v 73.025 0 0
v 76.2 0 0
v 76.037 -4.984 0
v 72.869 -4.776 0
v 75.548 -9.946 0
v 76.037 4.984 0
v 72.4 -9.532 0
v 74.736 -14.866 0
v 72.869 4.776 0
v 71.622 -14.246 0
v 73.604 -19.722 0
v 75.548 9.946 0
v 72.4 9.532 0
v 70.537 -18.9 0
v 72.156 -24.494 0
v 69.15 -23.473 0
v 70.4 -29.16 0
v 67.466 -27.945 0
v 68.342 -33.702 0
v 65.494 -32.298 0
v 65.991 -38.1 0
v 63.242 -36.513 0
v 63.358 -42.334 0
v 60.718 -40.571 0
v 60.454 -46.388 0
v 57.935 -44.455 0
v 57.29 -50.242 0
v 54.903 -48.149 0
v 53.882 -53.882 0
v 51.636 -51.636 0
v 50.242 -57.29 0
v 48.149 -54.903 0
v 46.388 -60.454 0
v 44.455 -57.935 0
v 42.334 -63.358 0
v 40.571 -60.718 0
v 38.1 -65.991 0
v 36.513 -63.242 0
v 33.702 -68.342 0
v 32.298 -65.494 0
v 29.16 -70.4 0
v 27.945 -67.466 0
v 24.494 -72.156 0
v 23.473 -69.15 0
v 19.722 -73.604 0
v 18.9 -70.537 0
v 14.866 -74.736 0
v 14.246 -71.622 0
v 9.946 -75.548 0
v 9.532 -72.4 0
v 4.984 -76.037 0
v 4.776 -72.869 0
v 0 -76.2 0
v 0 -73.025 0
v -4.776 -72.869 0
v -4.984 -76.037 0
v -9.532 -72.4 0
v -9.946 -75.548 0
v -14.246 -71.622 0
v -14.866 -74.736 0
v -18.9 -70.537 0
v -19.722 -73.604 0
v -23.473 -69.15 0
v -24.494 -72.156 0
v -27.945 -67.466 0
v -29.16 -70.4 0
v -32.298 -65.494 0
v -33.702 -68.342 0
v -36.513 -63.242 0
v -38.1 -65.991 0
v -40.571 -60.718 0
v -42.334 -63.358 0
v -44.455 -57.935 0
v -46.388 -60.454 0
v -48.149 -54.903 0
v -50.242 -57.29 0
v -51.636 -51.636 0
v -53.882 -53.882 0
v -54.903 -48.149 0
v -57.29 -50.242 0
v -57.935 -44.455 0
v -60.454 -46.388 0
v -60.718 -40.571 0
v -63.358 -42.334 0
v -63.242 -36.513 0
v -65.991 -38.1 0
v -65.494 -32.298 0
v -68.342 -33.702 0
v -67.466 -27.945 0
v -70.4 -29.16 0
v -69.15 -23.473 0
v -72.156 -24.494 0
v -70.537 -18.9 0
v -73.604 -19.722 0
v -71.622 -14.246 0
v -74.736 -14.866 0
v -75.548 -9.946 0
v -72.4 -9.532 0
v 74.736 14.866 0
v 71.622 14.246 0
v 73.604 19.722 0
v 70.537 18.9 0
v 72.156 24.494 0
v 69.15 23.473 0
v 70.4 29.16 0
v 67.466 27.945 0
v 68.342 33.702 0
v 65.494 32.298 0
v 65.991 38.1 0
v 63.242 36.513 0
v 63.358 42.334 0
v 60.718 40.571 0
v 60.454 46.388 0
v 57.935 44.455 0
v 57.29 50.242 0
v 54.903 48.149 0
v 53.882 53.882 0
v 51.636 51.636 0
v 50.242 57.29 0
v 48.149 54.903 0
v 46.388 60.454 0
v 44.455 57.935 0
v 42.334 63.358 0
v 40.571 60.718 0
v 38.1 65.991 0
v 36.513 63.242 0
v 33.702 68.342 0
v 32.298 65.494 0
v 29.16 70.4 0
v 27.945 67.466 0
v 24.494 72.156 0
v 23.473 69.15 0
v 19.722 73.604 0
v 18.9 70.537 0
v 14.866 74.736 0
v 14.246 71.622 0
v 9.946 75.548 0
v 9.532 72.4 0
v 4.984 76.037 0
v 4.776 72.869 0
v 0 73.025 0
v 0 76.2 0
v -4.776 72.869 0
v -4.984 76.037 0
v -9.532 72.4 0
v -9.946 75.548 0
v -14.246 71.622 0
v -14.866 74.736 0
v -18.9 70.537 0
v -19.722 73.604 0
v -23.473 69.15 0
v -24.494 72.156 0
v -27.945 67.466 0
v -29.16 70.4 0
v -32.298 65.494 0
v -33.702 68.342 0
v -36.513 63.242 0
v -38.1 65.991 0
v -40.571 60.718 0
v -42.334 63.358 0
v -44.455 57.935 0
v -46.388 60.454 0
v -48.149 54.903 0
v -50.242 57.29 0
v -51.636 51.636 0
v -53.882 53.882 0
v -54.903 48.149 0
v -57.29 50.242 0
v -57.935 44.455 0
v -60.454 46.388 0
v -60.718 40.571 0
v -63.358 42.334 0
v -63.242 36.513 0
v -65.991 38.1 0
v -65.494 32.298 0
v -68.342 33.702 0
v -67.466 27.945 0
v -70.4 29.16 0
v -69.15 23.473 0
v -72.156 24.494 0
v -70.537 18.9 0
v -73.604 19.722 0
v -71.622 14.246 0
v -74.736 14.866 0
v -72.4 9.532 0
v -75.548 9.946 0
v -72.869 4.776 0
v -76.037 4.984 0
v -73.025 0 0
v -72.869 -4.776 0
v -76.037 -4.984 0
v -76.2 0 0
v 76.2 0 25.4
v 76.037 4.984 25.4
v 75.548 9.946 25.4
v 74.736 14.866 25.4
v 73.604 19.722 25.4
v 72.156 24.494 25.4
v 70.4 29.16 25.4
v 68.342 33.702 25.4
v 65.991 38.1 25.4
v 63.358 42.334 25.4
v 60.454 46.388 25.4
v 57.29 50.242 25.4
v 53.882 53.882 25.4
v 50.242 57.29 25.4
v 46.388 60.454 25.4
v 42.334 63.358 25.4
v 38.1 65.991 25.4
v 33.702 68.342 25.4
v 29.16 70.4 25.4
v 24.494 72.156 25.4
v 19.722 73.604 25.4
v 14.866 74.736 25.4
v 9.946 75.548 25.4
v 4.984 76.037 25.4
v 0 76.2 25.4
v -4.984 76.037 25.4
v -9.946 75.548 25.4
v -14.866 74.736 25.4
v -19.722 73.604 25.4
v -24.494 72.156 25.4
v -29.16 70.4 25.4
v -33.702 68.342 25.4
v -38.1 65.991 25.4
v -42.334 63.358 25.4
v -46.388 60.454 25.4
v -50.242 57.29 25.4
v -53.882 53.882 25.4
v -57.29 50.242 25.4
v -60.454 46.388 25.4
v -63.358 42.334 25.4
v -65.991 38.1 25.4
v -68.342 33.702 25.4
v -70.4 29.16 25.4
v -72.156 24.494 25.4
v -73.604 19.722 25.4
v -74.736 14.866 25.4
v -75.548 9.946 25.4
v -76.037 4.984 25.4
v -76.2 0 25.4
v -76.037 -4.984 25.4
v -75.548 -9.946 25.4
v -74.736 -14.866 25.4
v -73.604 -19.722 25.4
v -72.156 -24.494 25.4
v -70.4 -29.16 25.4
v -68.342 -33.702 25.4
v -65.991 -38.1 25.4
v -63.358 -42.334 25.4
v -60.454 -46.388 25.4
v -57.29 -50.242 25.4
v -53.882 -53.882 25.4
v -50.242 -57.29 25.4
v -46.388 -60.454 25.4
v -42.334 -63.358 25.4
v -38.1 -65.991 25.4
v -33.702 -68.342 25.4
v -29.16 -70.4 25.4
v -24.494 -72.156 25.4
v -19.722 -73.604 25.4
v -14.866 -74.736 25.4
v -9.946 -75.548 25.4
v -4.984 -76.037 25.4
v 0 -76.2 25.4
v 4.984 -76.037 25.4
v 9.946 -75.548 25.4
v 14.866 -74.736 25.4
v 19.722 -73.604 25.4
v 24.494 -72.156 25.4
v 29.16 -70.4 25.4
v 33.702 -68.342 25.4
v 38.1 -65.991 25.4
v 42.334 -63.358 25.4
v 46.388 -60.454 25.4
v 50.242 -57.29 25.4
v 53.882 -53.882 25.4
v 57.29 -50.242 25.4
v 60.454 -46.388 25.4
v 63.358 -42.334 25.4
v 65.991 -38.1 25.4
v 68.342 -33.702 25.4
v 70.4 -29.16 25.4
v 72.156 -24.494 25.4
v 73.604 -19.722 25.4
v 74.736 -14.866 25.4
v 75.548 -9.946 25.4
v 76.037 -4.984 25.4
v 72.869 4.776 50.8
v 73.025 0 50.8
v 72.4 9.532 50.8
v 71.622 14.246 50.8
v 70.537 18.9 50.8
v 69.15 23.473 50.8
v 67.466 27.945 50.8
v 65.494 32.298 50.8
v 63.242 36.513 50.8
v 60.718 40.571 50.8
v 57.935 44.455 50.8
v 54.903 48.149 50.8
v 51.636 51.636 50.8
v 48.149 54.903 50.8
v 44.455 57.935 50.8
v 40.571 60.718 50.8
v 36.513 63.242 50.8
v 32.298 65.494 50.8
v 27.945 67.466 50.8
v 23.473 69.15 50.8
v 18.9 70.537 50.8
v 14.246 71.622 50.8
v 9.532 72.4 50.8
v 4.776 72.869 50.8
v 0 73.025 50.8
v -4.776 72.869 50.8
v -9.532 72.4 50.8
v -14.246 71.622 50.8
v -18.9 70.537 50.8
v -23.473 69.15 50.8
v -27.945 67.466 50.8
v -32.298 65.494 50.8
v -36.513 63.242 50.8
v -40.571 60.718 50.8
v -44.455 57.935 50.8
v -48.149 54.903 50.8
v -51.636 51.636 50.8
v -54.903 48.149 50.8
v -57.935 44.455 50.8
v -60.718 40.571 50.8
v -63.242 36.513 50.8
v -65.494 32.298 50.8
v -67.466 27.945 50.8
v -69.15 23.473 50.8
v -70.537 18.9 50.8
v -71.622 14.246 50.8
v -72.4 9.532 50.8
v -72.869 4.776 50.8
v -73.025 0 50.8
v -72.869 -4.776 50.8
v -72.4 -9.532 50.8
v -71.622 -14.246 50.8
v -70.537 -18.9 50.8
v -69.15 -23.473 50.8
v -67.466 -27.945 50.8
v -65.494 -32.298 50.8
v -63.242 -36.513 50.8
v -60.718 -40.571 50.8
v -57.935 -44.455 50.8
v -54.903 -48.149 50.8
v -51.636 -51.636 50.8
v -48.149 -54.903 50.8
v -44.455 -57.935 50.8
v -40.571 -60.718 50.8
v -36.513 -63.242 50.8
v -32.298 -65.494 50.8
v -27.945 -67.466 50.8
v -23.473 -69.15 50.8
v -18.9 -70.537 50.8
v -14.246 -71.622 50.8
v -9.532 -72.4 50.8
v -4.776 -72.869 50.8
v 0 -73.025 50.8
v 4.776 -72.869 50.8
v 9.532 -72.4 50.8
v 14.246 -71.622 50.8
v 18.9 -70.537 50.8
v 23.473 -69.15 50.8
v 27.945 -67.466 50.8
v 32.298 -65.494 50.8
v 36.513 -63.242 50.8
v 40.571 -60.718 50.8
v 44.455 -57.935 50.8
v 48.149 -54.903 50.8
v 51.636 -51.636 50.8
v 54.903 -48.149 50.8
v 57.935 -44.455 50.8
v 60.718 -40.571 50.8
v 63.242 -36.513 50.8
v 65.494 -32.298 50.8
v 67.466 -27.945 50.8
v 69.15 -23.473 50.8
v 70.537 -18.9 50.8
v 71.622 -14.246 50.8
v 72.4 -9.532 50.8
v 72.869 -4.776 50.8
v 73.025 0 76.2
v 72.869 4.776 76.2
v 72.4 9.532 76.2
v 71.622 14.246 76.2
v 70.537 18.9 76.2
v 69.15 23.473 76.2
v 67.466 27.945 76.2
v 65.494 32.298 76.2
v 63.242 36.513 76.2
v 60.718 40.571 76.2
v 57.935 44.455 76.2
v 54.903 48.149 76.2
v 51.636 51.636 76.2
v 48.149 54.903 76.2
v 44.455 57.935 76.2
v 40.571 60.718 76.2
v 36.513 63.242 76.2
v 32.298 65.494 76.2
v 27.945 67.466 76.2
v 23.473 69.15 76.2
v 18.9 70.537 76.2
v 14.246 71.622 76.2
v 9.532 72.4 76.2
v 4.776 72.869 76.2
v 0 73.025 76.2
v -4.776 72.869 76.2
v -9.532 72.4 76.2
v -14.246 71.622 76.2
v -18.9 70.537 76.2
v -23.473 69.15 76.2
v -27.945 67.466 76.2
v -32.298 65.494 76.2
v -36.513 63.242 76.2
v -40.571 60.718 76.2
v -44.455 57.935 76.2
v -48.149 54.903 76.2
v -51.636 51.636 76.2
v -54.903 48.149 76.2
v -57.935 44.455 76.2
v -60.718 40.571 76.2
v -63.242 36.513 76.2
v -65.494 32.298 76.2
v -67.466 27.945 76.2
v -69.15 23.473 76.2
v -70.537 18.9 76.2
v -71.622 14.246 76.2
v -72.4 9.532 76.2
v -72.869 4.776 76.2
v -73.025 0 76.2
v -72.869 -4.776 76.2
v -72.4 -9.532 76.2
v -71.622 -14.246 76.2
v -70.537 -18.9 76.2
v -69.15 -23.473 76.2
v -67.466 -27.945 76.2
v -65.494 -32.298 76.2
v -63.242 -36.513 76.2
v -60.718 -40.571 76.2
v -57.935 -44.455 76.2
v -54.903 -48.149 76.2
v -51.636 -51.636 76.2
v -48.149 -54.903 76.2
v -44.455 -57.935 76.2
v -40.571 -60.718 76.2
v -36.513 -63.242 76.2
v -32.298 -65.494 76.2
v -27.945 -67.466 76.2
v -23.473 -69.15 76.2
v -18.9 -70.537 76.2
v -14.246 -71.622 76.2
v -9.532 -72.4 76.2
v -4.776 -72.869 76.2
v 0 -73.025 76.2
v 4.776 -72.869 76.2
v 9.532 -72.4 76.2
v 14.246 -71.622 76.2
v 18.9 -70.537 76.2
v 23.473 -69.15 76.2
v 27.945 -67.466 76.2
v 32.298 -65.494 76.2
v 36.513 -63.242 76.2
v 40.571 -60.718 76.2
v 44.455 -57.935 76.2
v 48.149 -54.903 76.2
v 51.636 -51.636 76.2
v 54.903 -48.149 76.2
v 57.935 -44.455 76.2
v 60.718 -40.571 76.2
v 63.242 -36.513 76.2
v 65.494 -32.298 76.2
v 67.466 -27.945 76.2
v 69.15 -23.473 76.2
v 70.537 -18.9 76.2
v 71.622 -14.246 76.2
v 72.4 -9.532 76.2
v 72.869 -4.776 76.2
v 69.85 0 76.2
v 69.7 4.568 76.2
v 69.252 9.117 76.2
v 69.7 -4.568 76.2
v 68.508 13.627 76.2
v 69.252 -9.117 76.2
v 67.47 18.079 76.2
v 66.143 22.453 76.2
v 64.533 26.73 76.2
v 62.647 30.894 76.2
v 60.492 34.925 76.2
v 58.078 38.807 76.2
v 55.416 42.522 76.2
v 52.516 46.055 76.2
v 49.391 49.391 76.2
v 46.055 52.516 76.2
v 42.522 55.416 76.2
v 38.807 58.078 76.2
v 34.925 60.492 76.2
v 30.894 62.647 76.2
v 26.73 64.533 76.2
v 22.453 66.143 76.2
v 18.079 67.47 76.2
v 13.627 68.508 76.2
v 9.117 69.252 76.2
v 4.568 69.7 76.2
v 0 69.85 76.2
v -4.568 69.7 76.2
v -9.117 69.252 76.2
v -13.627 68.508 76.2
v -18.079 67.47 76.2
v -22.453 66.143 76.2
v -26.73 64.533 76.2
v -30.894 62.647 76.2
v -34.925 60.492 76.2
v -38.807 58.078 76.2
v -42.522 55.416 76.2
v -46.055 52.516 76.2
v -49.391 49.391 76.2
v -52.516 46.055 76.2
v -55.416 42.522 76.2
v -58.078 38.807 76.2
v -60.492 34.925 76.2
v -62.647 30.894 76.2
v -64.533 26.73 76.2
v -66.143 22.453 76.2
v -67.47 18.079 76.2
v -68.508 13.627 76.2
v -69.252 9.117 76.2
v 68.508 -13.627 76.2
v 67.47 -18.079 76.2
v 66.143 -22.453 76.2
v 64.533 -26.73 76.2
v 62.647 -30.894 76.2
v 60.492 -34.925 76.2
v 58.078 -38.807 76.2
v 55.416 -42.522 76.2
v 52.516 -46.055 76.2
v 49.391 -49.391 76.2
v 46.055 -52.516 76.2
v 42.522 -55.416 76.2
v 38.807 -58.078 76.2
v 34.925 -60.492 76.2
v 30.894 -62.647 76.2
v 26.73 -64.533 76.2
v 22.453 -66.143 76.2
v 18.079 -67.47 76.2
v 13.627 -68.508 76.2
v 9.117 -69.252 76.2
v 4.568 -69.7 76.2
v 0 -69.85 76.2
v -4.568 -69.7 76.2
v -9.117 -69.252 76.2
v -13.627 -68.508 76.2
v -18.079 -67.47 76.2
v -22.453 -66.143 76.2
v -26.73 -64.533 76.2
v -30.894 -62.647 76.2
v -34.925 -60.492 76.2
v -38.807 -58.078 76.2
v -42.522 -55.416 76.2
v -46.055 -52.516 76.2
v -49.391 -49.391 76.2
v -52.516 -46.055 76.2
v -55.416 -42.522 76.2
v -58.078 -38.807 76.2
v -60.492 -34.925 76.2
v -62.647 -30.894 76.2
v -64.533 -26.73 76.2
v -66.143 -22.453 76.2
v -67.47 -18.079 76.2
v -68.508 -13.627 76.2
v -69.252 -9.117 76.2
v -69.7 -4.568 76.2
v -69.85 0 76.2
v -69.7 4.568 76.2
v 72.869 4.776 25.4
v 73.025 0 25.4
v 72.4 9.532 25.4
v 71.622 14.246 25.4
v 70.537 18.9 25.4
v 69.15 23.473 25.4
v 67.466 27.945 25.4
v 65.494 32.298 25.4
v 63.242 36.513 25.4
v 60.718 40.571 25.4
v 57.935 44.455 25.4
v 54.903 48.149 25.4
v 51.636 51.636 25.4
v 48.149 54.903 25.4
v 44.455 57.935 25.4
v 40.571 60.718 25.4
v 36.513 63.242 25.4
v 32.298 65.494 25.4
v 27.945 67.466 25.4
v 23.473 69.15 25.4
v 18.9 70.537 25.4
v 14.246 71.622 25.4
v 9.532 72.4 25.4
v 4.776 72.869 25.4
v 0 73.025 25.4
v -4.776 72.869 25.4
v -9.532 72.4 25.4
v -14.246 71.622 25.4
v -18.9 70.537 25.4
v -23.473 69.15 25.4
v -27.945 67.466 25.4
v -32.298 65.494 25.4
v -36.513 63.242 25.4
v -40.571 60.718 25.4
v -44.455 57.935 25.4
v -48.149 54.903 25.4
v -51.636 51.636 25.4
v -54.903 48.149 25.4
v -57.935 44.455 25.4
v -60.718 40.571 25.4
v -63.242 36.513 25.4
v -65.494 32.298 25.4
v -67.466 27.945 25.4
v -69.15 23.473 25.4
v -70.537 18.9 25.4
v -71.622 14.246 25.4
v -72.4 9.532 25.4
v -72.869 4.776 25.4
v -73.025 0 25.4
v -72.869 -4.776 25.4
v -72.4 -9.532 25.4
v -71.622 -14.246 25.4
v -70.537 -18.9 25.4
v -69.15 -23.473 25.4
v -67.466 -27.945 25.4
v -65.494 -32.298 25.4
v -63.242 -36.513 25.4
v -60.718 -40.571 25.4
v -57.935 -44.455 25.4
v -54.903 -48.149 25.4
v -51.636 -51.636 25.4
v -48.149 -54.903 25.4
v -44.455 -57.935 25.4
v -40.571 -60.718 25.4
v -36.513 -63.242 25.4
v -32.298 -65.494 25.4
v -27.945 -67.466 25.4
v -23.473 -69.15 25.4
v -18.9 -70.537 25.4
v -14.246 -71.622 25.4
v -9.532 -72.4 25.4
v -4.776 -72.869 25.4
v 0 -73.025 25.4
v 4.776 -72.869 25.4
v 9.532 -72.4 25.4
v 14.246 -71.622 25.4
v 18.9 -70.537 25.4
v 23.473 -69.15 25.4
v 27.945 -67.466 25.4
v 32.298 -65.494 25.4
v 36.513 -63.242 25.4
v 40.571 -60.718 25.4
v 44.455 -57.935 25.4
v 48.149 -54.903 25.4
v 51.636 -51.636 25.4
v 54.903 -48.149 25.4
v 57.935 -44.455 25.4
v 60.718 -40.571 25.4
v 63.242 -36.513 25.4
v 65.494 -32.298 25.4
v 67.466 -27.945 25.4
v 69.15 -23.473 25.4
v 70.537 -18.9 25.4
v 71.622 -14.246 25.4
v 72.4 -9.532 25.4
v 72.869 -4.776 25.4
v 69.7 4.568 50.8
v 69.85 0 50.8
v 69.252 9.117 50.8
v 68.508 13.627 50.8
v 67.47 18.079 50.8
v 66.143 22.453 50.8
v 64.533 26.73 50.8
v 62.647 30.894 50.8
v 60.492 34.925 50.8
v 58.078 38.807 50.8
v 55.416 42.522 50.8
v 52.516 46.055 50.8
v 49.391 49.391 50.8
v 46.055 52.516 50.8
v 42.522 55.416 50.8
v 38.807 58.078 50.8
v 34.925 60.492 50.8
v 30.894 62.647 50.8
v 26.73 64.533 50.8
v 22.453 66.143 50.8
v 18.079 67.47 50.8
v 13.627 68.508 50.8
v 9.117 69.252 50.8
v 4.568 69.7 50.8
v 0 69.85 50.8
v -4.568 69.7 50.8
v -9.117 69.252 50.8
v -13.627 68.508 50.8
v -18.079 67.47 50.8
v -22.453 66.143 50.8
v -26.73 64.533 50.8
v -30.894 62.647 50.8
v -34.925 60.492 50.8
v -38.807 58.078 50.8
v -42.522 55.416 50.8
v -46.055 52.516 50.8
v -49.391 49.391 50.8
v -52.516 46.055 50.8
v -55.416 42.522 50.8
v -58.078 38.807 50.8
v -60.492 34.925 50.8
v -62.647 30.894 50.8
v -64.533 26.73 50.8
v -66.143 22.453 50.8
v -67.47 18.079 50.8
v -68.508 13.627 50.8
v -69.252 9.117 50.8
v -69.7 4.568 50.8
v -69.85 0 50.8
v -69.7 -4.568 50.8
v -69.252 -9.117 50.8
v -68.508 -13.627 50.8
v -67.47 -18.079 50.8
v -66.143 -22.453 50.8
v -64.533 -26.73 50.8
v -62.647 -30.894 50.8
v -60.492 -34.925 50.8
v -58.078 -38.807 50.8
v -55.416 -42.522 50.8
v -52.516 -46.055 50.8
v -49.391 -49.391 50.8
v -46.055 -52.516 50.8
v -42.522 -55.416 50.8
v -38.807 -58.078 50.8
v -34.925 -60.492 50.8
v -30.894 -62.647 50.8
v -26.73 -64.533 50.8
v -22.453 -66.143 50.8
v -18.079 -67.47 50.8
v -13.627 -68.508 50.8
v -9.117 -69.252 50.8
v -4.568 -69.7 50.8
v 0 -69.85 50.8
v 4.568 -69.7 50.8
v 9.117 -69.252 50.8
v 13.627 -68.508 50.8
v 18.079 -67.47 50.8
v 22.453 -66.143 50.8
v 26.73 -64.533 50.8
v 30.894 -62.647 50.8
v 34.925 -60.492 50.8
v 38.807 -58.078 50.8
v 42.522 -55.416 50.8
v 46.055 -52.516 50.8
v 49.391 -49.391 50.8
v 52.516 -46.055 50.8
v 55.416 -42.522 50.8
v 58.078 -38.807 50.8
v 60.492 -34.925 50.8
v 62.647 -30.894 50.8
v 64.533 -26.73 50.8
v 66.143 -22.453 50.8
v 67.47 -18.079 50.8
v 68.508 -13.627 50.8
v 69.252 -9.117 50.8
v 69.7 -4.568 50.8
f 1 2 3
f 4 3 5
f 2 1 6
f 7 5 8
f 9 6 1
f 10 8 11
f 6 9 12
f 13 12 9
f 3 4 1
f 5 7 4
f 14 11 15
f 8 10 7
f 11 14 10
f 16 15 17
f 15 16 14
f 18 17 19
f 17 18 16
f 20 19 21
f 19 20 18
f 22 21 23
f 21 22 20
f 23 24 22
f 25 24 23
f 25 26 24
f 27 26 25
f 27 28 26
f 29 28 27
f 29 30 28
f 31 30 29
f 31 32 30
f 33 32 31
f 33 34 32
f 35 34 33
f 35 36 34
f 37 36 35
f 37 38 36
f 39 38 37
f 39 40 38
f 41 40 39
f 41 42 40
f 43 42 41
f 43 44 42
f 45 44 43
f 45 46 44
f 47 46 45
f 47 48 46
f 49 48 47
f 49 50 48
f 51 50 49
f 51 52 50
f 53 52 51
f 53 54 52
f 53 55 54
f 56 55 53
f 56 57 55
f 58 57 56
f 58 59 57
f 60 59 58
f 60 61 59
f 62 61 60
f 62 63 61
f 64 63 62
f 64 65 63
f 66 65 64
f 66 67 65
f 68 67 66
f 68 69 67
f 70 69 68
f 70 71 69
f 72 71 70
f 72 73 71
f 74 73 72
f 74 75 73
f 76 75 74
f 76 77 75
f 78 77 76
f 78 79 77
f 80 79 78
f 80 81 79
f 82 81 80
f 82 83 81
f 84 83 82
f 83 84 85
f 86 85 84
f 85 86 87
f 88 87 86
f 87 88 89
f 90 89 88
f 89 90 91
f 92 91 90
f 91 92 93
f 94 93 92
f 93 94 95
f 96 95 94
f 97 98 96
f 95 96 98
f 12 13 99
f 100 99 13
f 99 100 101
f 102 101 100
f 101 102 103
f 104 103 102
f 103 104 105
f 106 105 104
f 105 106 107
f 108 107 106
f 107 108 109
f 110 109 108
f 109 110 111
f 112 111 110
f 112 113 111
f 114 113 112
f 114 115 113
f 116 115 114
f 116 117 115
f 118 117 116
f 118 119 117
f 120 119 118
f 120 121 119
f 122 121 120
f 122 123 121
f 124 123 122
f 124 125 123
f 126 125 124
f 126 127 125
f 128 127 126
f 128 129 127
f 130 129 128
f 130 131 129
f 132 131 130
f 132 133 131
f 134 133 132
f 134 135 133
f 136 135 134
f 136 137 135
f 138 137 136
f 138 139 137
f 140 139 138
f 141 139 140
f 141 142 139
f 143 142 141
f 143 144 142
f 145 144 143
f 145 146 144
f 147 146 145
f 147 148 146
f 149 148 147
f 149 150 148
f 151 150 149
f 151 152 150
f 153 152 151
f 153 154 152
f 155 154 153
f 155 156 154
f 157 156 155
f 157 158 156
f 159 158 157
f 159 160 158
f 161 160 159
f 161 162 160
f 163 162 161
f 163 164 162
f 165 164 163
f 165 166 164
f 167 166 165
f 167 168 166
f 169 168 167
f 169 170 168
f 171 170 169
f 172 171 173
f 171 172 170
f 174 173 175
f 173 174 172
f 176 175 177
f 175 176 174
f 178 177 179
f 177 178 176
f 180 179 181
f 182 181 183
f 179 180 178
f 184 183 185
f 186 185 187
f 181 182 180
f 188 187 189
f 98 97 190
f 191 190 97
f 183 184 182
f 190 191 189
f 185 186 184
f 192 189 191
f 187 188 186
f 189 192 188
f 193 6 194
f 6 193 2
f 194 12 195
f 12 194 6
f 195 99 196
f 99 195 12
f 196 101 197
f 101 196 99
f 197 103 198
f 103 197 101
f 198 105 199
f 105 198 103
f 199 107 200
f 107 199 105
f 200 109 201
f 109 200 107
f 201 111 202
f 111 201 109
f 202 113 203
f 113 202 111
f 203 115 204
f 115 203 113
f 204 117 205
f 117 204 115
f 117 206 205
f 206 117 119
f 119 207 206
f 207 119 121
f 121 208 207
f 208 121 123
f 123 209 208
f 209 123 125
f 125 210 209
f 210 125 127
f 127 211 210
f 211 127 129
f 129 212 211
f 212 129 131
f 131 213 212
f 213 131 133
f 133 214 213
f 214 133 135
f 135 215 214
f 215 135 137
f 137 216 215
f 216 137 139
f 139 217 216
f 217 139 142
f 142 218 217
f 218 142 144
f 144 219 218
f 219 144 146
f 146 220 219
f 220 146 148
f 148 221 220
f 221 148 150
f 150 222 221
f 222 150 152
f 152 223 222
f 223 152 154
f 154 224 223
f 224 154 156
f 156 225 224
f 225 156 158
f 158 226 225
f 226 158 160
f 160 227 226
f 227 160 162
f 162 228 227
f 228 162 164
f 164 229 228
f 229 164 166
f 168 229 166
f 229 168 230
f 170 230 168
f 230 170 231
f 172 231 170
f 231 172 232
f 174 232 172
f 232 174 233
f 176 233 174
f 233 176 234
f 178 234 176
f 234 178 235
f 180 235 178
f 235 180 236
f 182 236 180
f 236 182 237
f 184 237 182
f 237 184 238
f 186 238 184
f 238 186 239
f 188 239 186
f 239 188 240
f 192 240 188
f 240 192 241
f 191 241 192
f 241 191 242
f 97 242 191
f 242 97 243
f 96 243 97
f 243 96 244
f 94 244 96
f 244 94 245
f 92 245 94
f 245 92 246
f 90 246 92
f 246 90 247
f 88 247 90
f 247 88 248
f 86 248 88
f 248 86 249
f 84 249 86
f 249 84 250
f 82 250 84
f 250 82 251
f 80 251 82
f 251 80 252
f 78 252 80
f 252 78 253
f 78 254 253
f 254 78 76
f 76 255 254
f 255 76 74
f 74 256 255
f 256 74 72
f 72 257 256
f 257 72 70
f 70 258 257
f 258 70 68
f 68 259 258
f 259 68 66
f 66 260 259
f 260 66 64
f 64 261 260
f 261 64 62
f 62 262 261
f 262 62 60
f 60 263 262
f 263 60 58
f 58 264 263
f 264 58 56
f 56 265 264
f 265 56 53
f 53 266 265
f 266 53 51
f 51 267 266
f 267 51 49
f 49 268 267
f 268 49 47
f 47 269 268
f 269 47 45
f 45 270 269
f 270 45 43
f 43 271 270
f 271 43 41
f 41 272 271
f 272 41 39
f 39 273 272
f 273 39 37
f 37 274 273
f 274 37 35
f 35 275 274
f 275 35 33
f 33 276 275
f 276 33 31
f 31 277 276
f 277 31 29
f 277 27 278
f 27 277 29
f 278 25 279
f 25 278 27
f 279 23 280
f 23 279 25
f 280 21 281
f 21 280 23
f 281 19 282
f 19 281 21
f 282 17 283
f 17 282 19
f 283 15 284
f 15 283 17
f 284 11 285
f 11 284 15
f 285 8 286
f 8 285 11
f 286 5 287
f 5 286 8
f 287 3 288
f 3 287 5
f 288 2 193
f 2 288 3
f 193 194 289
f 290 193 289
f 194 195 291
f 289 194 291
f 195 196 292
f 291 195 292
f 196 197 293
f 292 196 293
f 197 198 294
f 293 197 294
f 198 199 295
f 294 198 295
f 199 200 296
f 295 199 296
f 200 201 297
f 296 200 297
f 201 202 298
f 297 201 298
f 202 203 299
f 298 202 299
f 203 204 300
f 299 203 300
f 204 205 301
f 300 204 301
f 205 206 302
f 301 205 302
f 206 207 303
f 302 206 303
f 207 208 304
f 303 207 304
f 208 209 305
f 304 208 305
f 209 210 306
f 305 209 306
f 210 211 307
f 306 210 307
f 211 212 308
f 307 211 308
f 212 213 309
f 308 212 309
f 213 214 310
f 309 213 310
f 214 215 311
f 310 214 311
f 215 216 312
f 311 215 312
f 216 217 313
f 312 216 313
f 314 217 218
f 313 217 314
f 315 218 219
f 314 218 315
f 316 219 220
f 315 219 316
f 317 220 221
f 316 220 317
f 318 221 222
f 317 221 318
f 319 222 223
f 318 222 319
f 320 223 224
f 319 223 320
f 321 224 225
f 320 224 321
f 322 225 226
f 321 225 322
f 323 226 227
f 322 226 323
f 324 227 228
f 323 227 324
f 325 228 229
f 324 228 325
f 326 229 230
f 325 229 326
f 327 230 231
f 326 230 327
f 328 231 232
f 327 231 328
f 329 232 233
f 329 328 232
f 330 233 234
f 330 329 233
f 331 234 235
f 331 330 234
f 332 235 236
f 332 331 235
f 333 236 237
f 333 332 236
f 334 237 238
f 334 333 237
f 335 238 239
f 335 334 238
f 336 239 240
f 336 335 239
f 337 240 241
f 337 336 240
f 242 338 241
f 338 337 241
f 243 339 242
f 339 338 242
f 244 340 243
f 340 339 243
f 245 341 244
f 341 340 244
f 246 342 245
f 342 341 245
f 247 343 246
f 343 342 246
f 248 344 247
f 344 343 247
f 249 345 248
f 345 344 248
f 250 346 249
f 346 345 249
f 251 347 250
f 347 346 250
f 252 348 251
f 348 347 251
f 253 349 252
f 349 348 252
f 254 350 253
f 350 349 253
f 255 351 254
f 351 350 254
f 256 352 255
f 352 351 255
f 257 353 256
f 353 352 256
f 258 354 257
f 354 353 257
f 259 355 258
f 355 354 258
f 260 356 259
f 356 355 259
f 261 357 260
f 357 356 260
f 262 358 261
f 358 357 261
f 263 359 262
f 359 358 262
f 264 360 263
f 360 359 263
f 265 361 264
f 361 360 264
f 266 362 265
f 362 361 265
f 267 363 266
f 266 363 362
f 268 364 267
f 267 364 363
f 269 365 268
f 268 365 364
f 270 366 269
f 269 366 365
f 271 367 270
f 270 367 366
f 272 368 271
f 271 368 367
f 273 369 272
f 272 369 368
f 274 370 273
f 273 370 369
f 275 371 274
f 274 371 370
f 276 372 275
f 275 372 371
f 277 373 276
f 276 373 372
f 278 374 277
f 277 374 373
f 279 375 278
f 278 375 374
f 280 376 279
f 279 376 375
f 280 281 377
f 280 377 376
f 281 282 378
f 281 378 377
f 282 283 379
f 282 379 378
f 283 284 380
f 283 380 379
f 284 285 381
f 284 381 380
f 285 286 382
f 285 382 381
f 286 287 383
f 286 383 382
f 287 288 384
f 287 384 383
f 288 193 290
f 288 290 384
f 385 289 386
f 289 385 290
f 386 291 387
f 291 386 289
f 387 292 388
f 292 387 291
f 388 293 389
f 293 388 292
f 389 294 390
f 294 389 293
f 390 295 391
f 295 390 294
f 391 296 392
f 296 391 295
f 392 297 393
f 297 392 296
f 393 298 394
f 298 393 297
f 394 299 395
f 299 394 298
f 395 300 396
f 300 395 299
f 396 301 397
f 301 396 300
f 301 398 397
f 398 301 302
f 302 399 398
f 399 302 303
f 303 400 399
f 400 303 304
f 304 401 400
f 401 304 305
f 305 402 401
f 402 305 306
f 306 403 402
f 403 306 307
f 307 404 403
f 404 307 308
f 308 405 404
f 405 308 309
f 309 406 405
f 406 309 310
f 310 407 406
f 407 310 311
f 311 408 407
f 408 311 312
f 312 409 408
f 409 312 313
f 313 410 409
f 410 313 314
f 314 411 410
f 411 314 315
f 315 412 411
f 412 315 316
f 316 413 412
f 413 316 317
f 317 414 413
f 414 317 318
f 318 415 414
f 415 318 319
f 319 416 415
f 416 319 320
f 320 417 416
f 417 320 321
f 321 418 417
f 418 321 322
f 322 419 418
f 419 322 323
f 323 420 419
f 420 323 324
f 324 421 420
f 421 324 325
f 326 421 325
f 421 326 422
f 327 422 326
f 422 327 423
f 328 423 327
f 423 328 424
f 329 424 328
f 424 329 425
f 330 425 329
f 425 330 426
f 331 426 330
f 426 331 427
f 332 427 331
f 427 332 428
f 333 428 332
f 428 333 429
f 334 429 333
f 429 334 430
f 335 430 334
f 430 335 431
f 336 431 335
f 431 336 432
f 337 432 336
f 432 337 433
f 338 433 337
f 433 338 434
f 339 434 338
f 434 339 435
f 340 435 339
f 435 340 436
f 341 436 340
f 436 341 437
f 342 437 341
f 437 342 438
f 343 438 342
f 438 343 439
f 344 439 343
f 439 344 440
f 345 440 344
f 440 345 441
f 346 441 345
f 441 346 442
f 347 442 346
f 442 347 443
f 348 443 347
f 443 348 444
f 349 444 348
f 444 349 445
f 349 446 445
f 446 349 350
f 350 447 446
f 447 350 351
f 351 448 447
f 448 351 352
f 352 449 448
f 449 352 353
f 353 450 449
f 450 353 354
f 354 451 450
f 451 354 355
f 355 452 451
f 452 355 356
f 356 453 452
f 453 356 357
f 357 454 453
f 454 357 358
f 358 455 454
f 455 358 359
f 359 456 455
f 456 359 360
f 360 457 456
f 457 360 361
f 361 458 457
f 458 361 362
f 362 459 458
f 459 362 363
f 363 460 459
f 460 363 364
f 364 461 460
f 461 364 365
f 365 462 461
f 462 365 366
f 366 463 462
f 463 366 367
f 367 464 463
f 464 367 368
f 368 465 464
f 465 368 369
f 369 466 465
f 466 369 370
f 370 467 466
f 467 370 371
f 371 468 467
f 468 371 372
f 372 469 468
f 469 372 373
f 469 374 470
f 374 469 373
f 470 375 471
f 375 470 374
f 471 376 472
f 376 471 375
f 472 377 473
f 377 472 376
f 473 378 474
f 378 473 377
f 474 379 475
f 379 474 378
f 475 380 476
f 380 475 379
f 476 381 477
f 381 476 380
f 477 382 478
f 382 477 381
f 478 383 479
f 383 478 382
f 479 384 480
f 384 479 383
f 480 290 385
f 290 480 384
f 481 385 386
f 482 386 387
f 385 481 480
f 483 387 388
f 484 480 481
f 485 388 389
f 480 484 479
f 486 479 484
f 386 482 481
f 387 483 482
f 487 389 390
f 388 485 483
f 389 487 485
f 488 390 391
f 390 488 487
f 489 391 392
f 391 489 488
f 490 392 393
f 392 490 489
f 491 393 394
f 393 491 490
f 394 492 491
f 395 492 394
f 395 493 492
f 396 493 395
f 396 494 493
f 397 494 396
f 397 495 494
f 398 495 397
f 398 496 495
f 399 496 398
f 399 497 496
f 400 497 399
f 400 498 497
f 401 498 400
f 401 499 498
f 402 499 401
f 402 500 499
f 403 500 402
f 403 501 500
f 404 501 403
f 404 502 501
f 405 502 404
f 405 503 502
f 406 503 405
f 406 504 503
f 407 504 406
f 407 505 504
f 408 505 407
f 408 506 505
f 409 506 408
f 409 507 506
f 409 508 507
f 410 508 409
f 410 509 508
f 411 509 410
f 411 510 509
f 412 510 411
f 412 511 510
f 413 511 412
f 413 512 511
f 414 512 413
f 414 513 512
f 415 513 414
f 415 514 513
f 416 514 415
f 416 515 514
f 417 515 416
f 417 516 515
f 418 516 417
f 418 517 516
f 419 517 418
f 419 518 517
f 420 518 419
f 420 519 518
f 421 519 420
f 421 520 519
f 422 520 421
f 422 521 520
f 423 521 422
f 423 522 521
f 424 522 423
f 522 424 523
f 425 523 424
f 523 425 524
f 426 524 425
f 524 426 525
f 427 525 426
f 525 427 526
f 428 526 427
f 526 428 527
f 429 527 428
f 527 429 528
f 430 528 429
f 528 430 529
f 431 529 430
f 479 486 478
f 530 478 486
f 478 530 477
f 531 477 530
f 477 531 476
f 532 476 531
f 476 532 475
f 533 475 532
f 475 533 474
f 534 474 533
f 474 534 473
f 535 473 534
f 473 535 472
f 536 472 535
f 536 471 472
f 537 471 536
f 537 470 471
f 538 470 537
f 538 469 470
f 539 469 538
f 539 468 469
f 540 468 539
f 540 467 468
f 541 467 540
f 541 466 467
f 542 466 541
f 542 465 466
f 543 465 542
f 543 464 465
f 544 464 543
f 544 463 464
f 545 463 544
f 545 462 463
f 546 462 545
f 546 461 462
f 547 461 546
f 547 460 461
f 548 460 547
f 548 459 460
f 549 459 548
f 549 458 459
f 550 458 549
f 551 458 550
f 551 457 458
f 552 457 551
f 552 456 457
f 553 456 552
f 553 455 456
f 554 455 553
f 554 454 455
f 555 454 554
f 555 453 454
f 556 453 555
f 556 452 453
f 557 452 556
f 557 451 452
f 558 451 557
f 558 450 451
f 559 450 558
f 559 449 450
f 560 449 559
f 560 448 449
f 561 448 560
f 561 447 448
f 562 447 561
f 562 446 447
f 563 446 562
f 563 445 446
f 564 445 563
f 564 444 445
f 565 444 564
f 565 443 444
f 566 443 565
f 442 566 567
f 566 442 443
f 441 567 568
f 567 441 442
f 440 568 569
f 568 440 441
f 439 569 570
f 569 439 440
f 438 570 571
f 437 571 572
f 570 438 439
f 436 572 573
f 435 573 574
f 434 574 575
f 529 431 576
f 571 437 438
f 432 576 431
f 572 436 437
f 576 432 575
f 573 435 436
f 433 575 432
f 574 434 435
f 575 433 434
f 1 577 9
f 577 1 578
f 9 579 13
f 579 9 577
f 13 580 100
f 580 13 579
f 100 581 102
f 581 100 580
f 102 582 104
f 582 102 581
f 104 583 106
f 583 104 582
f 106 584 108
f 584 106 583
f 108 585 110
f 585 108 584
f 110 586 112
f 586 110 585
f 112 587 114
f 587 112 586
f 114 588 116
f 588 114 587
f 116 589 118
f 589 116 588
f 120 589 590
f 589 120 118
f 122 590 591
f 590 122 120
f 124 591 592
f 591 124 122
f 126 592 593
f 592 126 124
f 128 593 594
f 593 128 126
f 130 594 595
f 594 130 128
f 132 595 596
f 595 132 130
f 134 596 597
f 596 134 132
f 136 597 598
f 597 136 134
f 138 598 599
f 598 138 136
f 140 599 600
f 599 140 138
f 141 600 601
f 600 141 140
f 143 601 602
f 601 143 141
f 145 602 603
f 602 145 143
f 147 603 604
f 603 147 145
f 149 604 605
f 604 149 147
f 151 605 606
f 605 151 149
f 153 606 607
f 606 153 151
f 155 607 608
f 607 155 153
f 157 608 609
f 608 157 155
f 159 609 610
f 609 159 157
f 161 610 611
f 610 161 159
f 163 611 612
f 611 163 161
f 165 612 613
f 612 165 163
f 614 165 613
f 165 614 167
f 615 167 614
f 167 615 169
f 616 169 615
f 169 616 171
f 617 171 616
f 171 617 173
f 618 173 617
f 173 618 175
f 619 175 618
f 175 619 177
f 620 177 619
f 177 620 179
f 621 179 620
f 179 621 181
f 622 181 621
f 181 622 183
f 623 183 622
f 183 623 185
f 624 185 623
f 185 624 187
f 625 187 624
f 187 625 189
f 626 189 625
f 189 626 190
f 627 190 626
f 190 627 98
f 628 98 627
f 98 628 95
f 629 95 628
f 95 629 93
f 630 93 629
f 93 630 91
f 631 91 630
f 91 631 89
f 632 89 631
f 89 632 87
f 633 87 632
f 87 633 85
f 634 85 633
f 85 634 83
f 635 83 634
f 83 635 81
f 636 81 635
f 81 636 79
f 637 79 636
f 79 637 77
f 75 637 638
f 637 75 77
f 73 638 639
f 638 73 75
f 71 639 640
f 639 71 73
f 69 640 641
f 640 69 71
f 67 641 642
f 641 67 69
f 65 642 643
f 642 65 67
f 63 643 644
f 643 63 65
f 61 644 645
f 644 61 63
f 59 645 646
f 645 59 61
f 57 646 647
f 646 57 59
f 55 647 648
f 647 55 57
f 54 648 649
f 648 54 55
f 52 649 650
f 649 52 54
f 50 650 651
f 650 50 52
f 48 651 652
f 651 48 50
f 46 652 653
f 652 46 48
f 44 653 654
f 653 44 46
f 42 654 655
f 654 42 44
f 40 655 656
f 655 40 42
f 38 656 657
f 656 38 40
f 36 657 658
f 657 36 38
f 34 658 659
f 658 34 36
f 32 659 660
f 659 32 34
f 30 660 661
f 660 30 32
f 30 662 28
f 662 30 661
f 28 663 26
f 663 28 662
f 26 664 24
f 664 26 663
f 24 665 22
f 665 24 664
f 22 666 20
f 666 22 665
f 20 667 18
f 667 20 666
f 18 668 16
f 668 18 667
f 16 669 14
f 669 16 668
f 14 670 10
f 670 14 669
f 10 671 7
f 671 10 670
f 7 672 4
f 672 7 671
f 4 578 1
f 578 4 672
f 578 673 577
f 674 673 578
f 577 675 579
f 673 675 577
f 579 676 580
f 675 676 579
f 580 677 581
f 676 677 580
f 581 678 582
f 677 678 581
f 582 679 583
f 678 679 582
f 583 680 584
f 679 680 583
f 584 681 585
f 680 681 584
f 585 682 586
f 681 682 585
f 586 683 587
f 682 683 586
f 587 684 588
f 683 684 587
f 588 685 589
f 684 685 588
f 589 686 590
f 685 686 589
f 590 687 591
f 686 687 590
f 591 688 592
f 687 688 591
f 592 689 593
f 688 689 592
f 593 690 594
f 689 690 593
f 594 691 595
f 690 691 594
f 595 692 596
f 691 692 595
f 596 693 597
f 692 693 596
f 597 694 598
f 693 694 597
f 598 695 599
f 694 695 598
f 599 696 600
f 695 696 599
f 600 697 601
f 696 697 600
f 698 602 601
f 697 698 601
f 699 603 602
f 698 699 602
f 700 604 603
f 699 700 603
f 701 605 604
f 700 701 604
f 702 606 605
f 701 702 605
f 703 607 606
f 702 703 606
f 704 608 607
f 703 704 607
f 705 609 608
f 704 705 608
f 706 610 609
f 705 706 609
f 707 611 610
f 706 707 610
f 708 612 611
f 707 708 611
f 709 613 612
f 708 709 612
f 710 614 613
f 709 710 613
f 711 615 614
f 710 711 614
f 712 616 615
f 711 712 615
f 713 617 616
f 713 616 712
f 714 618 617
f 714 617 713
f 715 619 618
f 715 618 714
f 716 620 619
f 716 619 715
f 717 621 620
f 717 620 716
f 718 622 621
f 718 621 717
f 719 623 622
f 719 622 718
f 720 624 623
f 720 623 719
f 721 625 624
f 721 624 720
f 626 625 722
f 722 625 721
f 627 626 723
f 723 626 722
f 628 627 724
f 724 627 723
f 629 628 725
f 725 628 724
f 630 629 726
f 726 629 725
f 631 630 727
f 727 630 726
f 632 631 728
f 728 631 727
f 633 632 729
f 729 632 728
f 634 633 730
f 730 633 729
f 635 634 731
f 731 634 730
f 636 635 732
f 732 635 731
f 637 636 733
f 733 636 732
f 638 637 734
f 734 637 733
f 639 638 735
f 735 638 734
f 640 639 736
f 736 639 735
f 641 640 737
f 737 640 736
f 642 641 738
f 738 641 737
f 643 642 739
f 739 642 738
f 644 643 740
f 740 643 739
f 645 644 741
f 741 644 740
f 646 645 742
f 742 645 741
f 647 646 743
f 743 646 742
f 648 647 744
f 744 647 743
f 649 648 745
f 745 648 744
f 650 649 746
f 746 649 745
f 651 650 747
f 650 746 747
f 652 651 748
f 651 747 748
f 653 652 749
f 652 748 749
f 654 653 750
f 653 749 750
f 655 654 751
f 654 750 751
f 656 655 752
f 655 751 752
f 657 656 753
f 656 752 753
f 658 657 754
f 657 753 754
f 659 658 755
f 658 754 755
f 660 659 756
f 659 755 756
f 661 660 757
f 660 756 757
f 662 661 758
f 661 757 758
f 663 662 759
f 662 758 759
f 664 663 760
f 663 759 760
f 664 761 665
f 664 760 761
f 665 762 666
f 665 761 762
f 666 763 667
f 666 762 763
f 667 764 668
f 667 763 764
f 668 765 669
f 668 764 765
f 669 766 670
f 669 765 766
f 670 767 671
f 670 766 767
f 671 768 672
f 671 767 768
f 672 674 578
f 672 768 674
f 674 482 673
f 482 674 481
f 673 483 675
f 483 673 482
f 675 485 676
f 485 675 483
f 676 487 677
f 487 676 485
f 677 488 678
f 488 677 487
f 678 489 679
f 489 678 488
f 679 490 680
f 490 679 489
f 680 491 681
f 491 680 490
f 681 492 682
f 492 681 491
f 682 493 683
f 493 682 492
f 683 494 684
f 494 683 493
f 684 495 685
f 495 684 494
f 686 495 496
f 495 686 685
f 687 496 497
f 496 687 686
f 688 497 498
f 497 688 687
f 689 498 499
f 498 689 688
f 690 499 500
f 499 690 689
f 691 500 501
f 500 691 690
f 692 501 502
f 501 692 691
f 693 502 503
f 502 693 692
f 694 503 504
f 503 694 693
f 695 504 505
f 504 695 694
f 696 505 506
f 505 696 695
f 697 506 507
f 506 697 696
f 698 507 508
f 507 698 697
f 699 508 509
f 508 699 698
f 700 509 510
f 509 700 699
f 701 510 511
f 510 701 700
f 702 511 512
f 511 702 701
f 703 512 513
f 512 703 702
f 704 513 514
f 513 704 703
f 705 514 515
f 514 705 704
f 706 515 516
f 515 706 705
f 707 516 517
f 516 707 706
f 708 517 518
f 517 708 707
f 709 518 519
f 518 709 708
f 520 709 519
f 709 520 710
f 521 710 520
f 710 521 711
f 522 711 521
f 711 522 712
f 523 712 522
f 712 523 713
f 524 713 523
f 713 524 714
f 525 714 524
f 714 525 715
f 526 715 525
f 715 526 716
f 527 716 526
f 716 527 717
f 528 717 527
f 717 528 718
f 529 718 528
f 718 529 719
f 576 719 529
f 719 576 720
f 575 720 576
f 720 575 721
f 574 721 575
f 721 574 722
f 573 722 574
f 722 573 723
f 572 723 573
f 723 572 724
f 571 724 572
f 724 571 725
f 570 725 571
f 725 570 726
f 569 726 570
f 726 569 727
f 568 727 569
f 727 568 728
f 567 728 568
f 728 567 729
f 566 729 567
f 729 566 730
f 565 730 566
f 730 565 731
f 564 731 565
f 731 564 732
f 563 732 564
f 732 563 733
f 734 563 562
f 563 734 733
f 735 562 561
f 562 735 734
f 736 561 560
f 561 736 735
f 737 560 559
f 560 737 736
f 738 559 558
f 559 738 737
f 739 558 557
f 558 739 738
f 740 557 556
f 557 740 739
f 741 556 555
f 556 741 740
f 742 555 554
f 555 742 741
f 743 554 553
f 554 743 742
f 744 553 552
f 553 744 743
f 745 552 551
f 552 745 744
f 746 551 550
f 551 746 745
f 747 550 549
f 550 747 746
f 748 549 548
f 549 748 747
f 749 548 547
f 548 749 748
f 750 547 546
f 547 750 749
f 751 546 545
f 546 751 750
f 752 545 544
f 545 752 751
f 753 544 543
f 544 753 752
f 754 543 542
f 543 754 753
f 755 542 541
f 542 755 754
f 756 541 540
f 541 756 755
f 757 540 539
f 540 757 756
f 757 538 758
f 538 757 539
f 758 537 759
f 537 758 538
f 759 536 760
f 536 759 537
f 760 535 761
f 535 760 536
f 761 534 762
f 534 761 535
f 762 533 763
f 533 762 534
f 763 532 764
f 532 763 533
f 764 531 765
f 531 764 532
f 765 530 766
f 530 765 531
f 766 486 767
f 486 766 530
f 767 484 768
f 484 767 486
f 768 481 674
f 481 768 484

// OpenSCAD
// file: ../lib/TOGArrayLib1.scad
// TOGArrayLib1.4
// 
// Functions for working with arrays.
// 
// v1.1:
// - tal1_reduce assert(is_list(items)) to prevent infinite recursion
//   when given undefined or other non-list values
// v1.1.1:
// - Fix tal1_uniq_remap_v2 to return "list-remap-result" as the
//   first element of the returned list
// v1.2:
// - Add tal1_replace_at function
// v1.3:
// - tal1_is_vec_of, tal1_is_vec_of_num
// v1.4:
// - tal1_assert_for_each, for when you want to assert something
//   about each of a list of items and get nice failure messages

/**
 * Make a list with the contents of list `a`,
 * but starting at offset `off`, replaced by the contents of list `b`.
 * len(result) = max(len(a), off+len(b))
 */
function tal1_replace_at(a, off, b, default_value=undef, default_value_function=undef) =
	assert(is_list(a))
	assert(is_list(b))
	let( _dvf = !is_undef(default_value_function) ? default_value_function : function(i) default_value )
[
	for( i=[0:1:min(off,len(a))-1] ) a[i],
	for( i=[len(a):1:off-1] ) _dvf(i),
	for( i=[off:1:off+len(b)-1] ) b[i-off],
	for( i=[off+len(b):1:len(a)-1] ) a[i],
];

// Simplest case
assert([] == tal1_replace_at([], 0, []));
// Second simplest cases
assert(["foo"] == tal1_replace_at(["foo"], 0, []));
assert(["foo"] == tal1_replace_at([], 0, ["foo"]));
// Replace one item
assert(["foo","quux","baz"] == tal1_replace_at(["foo","bar","baz"], 1, ["quux"]));
// Replace and extend
assert(["foo","quux","tuna","tina"] == tal1_replace_at(["foo","bar","baz"], 1, ["quux", "tuna", "tina"]));
// Add beyond end of `a`
assert(["foo","zzz","quux"] == tal1_replace_at(["foo"], 2, ["quux"], default_value="zzz"));
// Adding 'nothing' should still fill to that point with defaults
assert(["foo","zzz","zzz"] == tal1_replace_at(["foo"], 3, [], default_value="zzz"));


function tal1_reduce(start, items, func, offset=0) =
	assert(is_list(items))
	len(items) == offset ? start :
	tal1_reduce(func(start, items[offset]), items, func, offset+1);

function tal1_consecutive_duplicate_count(items) = tal1_reduce(
	[0, undef],
	items,
	function(z,item) [z[0] + (item == z[1] ? 1 : 0), item]
)[0];

assert(0 == tal1_consecutive_duplicate_count([]));
assert(0 == tal1_consecutive_duplicate_count([50]));
assert(1 == tal1_consecutive_duplicate_count([50,50]));
assert(0 == tal1_consecutive_duplicate_count([50,51,52,53]));
assert(1 == tal1_consecutive_duplicate_count([50,51,52,52]));
assert(3 == tal1_consecutive_duplicate_count([50,50,50,50]));

// Set test_size to arbirarily large values
// to ensure that OpenSCAD can handle heavy recursion
let(test_size=1000) assert(test_size/2 == tal1_consecutive_duplicate_count([for(i=[0:1:test_size-1]) floor(i/2)]));



function tal1_uniq_(items, off0, off1) =
	let(chunklen = off1-off0)
	chunklen == 0 ? [] :
	chunklen == 1 ? [items[off0]] :
	let(half=floor(chunklen/2))
	let(left  = tal1_uniq_(items, off0     , off0+half))
	let(right = tal1_uniq_(items, off0+half, off1     ))
	assert(len(left) > 0)
	assert(len(right) > 0)
	left[len(left)-1] == right[0] ? [each left, for(i=[1:1:len(right)-1]) right[i]] :
	[each left, each right];

/** Given a list of items, returns a new list with identical consecutive items merged */
function tal1_uniq(items) = tal1_uniq_(items, 0, len(items));

assert([] == tal1_uniq([]));
assert([123] == tal1_uniq([123]));
assert([55,0,1,2,3] == tal1_uniq([55,0,1,2,3]));
assert([55,0,1,2] == tal1_uniq([55,0,1,1,2]));
assert([55,0,1] == tal1_uniq([55,55,0,0,0,0,0,0,1,1,1,1]));
assert([55,0] == tal1_uniq([55,0,0,0,0,0,0,0]));



/**
 * Returns [new items, old index -> new index mapping].
 * No-op version.
 */
function tal1_uniq_remap_v1(items) =
	["list-remap-result", items, [for (vi=[0:1:len(items)-1]) vi]];

// [a, a, b, b, c, c]
//
// [a,    ...], []  -> [a],[0]
// [a, a, ...], [0] -> [a],[0,0]

assert([1,2,3] == [1,2,3]);

/**
 * Recursive version that will combine adjacent identical vertexes,
 * but will use the original items.
 */
function tal1_uniq_remap_v2(items, map=[]) =
	let(index = len(map))
	len(items) == index ? ["list-remap-result", items, map] :
	index == 0 ? tal1_uniq_remap_v2(items, [0]) :
	items[index] == items[map[index-1]] ? tal1_uniq_remap_v2(items, [for(vi=map) vi, map[index-1]]) :
	tal1_uniq_remap_v2(items, [for(vi=map) vi, index]);

assert(tal1_uniq_remap_v2([1,1,2,2,3,4]) == ["list-remap-result", [1,1,2,2,3,4], [0,0,2,2,4,5]]);


/**
 * Returns true if `vec` is a list of at least min_len items
 * and component_check(each item, even those beyond min_len) is true.
 */
function tal1_is_vec_of(vec, min_len=0, component_check=function(x) true) =
	assert(is_num(min_len) && min_len >= 0)
	assert(is_function(component_check))
	is_list(vec) && len(vec) >= min_len &&
	tal1_reduce(true, vec, function(prev,item) prev && component_check(item));

function tal1_is_vec_of_num(vec, min_len=0) = tal1_is_vec_of(vec, min_len, function(i) is_num(i));

assert( true == tal1_is_vec_of_num([1,2,3]));
assert( true == tal1_is_vec_of_num([]));
assert( true == tal1_is_vec_of_num([1,2,3], 3));
assert(false == tal1_is_vec_of_num([1,2], 3));
assert(false == tal1_is_vec_of_num([1,2,"spoon"], 3));
// Requirements are ambiguous when
// first min_len items are numbers, but there are non-numeric items afterwards,
// so let's error on the side of saying 'no, it's not a list of numbers';
// i.e. the item check and the min_len are independent.
assert(false == tal1_is_vec_of_num([1,2,3,"artichoke"], 3));


/**
 * Asserts that item_checker(each item in list, index of item)[0] is true.
 * Second element of item_checker return value is assertion message.
 * Returns the original list, in case that's useful to you.
 */
function tal1_assert_for_each(list, item_checker) =
	let( _ignored = [ for(i=[0:1:len(list)-1])
		let(q=item_checker(list[i],i))
		let(passed=is_bool(q) ? q : is_list(q) ? q[0] : assert(false, str(
			"tal1_assert_for_each: item_checker should return Bool|[Bool,String], but returned ",
			q, " for item at index ", i)))
		let(message=is_list(q) ? q[1] : undef)
		assert(passed, message)
		q
	])
	list;

// Callback can return a boolean...
assert([1,2,3] == tal1_assert_for_each([1,2,3], function(v,i) is_num(v)));
// ...or a [boolean, string]
assert([1,2,3] == tal1_assert_for_each([1,2,3], function(v,i) [is_num(v), "element be a num"]));
// file: ../lib/TOGMod1Constructors.scad
// TOGMod1Constructors-v1.5
// 
// Functions to construct objects understood by TOGMod1
// 
// v1.1:
// - Add togmod1_make_rounded_rect
// v1.2:
// - togmod1_make_rounded_rect can make ovals
// v1.3:
// - togmod1_circle_points, to just get the points of a circle
// - if pos parameter to circle function has a third element,
//   returned vertexes will include it as the z component;
// v1.3.1
// - Some assertions
// v1.4:
// - Refactor togmod1_rounded_rect_points and togmod1_circle_points
//   to use togmod1__make_nd_vector_adder for adapting to whatever
//   `pos` parameter is.
// v1.5:
// - togmod_rounded_rect_points will not simplify completely rounded sides
//   (where length of side is exactly twice the rounding radius)
//   unless simplify_rounded_sides=true
//   - This makes it more useful for polyhedron generation,
//     where radius varies, but number of points must remain constant.

use <./TOGArrayLib1.scad>

function togmod1__make_nd_vector_adder(origin=[0,0]) =
	let(origin_is_zero = tal1_reduce(true, origin, function(prev,item) prev && item == 0))
	origin_is_zero ? (function(vec) len(vec) >= len(origin) ? vec : tal1_replace_at(origin, 0, vec)) :
	function(vec) [
		for(i=[0:1:max(len(origin),len(vec))-1]) (len(vec) > i ? vec[i] : 0) + (len(origin) > i ? origin[i] : 0),
	];

assert([1,2,3] == togmod1__make_nd_vector_adder()([1,2,3]));
echo(togmod1__make_nd_vector_adder([0,0,3])([1,2]));
assert([1,2,3] == togmod1__make_nd_vector_adder([0,0,3])([1,2]));


function togmod1_make_cuboid(size) =
	assert(is_list(size))
	assert(len(size) >= 3)
	assert(is_num(size[0]))
	assert(is_num(size[1]))
	assert(is_num(size[2]))
	["polyhedron-vf", [
		[-size[0]/2, -size[1]/2, -size[2]/2],
		[+size[0]/2, -size[1]/2, -size[2]/2],
		[-size[0]/2, +size[1]/2, -size[2]/2],
		[+size[0]/2, +size[1]/2, -size[2]/2],
		[-size[0]/2, -size[1]/2, +size[2]/2],
		[+size[0]/2, -size[1]/2, +size[2]/2],
		[-size[0]/2, +size[1]/2, +size[2]/2],
		[+size[0]/2, +size[1]/2, +size[2]/2]
	], [
		[0,1,3,2],[0,4,5,1],[4,6,7,5],[3,7,6,2],[1,5,7,3],[6,4,0,2]
	]];

function togmod1_make_polygon(verts) =
	["polygon-vp", verts, [[for( i=[0:1:len(verts)-1] ) i%len(verts)]]];

function togmod1_rounded_rect_points(size, r, pos=[0,0], simplify_rounded_sides=false) =
	assert(is_list(size))
	assert(len(size) >= 2)
	let(radii = is_list(r) ? r : is_num(r) ? [r,r] : assert(false, "rounded_rect r(adius) should be list<num> or num"))
	let(rx = radii[0])
	let(ry = radii[1])
	assert(is_num(rx))
	assert(is_num(ry))
	assert(size[0] >= 2*rx, str("size[0] must be >= 2*r[0]; size[0] = ",size[0],", 2*r[0] = ",2*rx))
	assert(size[1] >= 2*ry, str("size[1] must be >= 2*r[1]; size[1] = ",size[1],", 2*r[1] = ",2*ry))
	let(quarterfn=max($fn/4, 1))
	let(qfnx = simplify_rounded_sides && size[0] == 2*rx ? quarterfn-1 : quarterfn)
	let(qfny = simplify_rounded_sides && size[1] == 2*ry ? quarterfn-1 : quarterfn)
	let(finalizepos = togmod1__make_nd_vector_adder(pos))
[
	for(a=[0 : 1 : qfnx]) let(ang=      a*90/quarterfn) finalizepos([ size[0]/2-rx + rx*cos(ang),  size[1]/2-ry + ry*sin(ang)]),
	for(a=[0 : 1 : qfny]) let(ang= 90 + a*90/quarterfn) finalizepos([-size[0]/2+rx + rx*cos(ang),  size[1]/2-ry + ry*sin(ang)]),
	for(a=[0 : 1 : qfnx]) let(ang=180 + a*90/quarterfn) finalizepos([-size[0]/2+rx + rx*cos(ang), -size[1]/2+ry + ry*sin(ang)]),
	for(a=[0 : 1 : qfny]) let(ang=270 + a*90/quarterfn) finalizepos([ size[0]/2-rx + rx*cos(ang), -size[1]/2+ry + ry*sin(ang)]),
];

function togmod1_make_rounded_rect(size, r) =
	togmod1_make_polygon(togmod1_rounded_rect_points(size,r,simplify_rounded_sides=true));

function togmod1_circle_points(r, pos=[0,0], d=undef) =
	assert( !is_undef(r) || !is_undef(d) )
	assert(!is_undef(pos[0]))
	assert(!is_undef(pos[1]))
	let(finalizepos = togmod1__make_nd_vector_adder(pos))
	let(r_ = !is_undef(r) ? r : d/2)
	let(fn = max($fn, 6))
	[for(i=[0 : 1 : fn-1]) finalizepos([r_*cos(i*360/fn), r_*sin(i*360/fn)])];

function togmod1_make_circle(r, pos=[0,0], d=undef) =
	togmod1_make_polygon(togmod1_circle_points(r=r, pos=pos, d=d));

function togmod1_make_cylinder(d, zrange=[0,1], r=undef, pos=[0,0]) =
	assert( !is_undef(r) || !is_undef(d) )
	let( r_ = !is_undef(r) ? r : d/2 )
	// TODO: Make polyhedron directly
	["linear-extrude-zs", zrange, togmod1_make_circle(r=r_, pos=pos)];

function togmod1__is_range1d(range) = is_list(range) && len(range) == 2 && is_num(range[0]) && is_num(range[1]);

function togmod1_linear_extrude_z(range, shape) =
	assert(togmod1__is_range1d(range))
	["linear-extrude-zs", range, shape];
function togmod1_linear_extrude_x(range, shape) =
	assert(togmod1__is_range1d(range))
	["rotate", [90, 0, 90], togmod1_linear_extrude_z(range, shape)];
function togmod1_linear_extrude_y(range, shape) =
	assert(togmod1__is_range1d(range))
	["rotate", [90, 0, 180], togmod1_linear_extrude_z(range, shape)];
// file: ../lib/TOGMod1.scad
// TOGMod1
// OpenSCAD library for representing shapes
// 
// See also: Functional OpenSCAD (https://github.com/thehans/FunctionalOpenSCAD)

module togmod1_domodule(mod) {
	assert(is_list(mod));
	assert(len(mod) > 0);
	if( mod[0] == "polygon-vp" ) {
		// ["polygon-vp", vertexes, paths]
		polygon(points=mod[1], paths=mod[2]);
	} else if( mod[0] == "polyhedron-vf" ) {
		polyhedron(mod[1], faces=mod[2]);
	} else if( mod[0] == "scale" ) {
		assert(len(mod) == 3);
		scale(mod[1]) togmod1_domodule(mod[2]);
	} else if( mod[0] == "translate" ) {
		assert(len(mod) == 3);
		assert(is_list(mod[1]));
		for(c=mod[1]) assert(is_num(c), "translate component should be numeric");
		translate(mod[1]) togmod1_domodule(mod[2]);
	} else if( mod[0] == "rotate" ) {
		assert(len(mod) == 3);
		rotate(mod[1]) togmod1_domodule(mod[2]);
	} else if( mod[0] == "intersection" ) {
		intersection_for( i=[1:1:len(mod)-1] ) togmod1_domodule(mod[i]);
	} else if( mod[0] == "difference" ) {
		difference() {
			togmod1_domodule(mod[1]);
			for( i=[2:1:len(mod)-1] ) togmod1_domodule(mod[i]);
		}
	} else if( mod[0] == "union" ) {
		for( i=[1:1:len(mod)-1] ) togmod1_domodule(mod[i]);
	} else if( mod[0] == "hull" ) {
		hull() for( i=[1:1:len(mod)-1] ) togmod1_domodule(mod[i]);
	} else if( mod[0] == "linear-extrude-zs" ) {
		// ["linear-extrude-zs", [z0,z1], 2d_shape] // centered
		// ["linear-extrude-zs", height, 2d_shape]
		let( zrange = is_list(mod[1]) ? mod[1] : [-mod[1]/2, mod[1]/2] ) {
			translate([0,0,zrange[0]]) linear_extrude(zrange[1]-zrange[0]) togmod1_domodule(mod[2]);
		}
	} else if( mod[0] == "render" ) {
		render() togmod1_domodule(mod[1]);
	} else if( mod[0] == "x-debug" ) {
		# togmod1_domodule(mod[1]);
	} else {
		assert(false, str("Unrecognized shape: ", mod[0]));
	}
}
// main file
// DuctSegment1.0.1-dev
// 
// For now this just demonstrates
// a way to make tapered pipe segment

module __alksd_end_params() { }

inch = 25.4;

// According to ChatGPT, which could be wrong,
// 6" refers to the inner diameter of the pipe.
// TODO: Actually measure some and see.

mating_surface_diameter = 6*inch;

h_fn = $preview ? 48 : 96;

use <../lib/TOGMod1.scad>
use <../lib/TOGMod1Constructors.scad>
use <../lib/TOGPolyhedronLib1.scad>

// Taper       = [ [z, od], ... ]
// HollowTaper = [ [z, od, id], ... ]

function taper_to_shape( taper ) =
	tphl1_make_polyhedron_from_layer_function( taper,
		function(layer) togmod1_circle_points(d=layer[1], pos=[0,0,layer[0]])
	);

function hollow_taper_to_shape( taper ) = ["difference",
	taper_to_shape(taper),
	taper_to_shape([
		[taper[0][0]-1, taper[0][2]],
		for( l=taper ) [l[0], l[2]],
		[taper[len(taper)-1][0]+1, taper[len(taper)-1][2]]
	])
];

function pipeseg(zrange, id, od) =
	hollow_taper_to_shape([
		[zrange[0], od, id],
		[zrange[1], od, id],
		[zrange[1]*2, id, id-(od-id)],
		[zrange[1]*3, id, id-(od-id)],
	], $fn=h_fn);

togmod1_domodule(pipeseg([0, 1*inch], 6*inch - 6.35, 6*inch));
